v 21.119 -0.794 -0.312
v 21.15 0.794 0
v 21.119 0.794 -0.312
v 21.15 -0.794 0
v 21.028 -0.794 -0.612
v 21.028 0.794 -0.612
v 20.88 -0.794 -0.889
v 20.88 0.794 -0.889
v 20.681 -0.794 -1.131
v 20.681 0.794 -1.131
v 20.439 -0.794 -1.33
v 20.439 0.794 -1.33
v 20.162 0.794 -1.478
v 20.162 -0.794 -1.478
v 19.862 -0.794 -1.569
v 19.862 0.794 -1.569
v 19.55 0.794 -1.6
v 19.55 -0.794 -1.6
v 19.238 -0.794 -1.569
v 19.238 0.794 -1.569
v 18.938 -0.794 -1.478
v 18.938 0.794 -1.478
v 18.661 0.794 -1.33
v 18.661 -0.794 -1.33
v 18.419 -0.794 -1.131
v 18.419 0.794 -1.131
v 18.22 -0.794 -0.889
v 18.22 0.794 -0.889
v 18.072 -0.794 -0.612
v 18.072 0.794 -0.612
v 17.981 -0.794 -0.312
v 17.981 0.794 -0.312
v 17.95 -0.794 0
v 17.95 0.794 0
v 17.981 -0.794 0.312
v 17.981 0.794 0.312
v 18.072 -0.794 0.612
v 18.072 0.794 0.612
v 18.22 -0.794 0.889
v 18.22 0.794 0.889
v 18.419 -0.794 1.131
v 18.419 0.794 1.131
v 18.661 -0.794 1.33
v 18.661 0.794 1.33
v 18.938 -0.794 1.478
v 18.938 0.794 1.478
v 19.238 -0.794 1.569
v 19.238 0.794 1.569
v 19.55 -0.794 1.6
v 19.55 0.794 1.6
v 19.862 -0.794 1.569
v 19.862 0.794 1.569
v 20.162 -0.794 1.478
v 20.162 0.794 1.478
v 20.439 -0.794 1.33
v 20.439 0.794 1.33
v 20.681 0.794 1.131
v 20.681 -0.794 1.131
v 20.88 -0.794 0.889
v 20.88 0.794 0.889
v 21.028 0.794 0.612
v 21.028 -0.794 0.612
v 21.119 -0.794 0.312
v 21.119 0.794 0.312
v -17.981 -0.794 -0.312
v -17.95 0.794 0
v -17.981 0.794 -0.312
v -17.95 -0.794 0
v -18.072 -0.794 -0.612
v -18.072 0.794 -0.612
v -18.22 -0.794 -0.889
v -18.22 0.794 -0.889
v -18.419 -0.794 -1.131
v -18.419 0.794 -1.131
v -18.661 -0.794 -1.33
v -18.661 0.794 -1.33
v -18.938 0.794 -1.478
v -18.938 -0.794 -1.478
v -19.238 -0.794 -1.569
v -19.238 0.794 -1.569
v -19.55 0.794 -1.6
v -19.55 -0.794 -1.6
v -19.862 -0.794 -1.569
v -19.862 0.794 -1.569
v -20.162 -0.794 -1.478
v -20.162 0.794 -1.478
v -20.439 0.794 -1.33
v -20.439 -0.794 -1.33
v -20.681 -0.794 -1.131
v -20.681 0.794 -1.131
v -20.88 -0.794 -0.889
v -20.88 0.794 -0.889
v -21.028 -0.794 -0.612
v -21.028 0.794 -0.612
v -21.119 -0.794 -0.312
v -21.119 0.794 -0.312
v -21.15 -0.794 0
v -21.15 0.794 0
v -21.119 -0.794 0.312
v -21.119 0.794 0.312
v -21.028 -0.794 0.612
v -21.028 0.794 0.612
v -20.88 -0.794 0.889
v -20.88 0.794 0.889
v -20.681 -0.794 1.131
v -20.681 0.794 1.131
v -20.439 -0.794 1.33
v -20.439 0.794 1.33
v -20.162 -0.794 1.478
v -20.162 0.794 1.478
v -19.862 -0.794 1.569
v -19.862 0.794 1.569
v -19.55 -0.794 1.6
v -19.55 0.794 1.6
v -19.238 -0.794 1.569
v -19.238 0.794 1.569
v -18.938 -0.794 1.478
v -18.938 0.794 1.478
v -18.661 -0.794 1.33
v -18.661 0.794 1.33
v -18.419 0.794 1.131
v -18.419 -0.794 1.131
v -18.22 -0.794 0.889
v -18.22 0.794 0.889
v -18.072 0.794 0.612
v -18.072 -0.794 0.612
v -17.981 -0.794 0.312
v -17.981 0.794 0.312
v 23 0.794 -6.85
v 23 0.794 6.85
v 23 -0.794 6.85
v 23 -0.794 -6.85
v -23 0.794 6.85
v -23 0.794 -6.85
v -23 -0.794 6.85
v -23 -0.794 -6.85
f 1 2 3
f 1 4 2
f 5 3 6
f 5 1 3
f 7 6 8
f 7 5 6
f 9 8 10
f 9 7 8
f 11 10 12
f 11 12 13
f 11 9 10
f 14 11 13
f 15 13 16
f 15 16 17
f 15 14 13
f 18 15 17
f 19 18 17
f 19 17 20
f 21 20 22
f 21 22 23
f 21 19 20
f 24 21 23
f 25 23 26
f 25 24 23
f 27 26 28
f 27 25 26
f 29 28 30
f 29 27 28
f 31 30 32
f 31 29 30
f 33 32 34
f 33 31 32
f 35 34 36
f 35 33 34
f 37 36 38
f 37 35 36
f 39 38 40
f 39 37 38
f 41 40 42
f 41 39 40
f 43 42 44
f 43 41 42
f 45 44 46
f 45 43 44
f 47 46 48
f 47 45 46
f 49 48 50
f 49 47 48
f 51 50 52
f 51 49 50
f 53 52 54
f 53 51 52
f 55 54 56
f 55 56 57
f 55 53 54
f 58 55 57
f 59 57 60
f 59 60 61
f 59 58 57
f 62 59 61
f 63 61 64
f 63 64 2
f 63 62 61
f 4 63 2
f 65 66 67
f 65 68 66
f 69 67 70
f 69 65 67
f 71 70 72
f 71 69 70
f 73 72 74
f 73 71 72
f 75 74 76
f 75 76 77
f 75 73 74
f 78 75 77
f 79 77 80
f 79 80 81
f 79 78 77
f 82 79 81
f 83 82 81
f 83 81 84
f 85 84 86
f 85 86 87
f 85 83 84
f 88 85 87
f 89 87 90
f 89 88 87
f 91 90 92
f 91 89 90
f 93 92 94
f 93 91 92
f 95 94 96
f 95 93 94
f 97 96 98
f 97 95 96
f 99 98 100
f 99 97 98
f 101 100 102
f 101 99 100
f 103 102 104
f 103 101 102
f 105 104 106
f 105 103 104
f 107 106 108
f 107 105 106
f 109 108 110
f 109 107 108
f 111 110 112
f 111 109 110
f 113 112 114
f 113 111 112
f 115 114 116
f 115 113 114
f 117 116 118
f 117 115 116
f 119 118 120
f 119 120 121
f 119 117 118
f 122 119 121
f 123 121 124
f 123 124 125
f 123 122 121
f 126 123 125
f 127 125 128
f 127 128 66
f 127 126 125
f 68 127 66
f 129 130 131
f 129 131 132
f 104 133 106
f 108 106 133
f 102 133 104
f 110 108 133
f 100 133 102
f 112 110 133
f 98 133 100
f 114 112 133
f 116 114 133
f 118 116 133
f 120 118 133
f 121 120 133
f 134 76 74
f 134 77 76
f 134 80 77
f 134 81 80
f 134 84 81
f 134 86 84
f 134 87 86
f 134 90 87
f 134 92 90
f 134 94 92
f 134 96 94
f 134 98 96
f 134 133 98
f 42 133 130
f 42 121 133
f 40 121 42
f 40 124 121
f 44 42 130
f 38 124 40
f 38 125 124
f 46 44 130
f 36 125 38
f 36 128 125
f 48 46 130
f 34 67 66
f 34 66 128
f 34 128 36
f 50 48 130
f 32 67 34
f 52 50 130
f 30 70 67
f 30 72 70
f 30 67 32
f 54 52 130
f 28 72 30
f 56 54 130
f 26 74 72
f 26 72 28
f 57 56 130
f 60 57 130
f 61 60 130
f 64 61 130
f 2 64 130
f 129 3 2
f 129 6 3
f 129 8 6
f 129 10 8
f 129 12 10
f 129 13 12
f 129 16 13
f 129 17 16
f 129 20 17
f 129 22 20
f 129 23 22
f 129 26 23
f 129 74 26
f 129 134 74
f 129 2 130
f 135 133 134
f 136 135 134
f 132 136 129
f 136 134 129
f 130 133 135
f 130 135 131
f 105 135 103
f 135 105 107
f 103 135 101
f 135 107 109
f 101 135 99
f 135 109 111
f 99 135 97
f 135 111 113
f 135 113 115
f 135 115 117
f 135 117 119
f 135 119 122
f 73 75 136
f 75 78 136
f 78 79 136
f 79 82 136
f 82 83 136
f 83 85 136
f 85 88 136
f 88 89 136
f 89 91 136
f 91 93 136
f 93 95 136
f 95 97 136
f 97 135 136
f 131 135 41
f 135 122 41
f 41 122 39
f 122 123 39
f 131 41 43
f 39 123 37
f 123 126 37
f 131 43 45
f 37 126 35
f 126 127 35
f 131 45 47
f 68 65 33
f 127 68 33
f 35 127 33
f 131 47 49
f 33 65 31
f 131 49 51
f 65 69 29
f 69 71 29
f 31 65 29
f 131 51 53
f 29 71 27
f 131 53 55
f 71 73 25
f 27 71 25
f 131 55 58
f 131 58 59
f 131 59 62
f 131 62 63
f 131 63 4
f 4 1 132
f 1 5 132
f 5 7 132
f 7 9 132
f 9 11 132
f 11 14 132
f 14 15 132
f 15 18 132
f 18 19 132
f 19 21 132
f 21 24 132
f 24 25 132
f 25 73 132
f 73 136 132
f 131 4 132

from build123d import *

# Parameters (mm, degrees)
SKETCH1_W           = 45.999999948
SKETCH1_H           = 13.700000032
SKETCH1_R           = 1.599999975
BOSS_EXTRUDE1_DEPTH = 0.79375


with BuildPart() as part:
    # Sketch1 → Boss-Extrude1 (new body, symmetric)
    with BuildSketch(Plane(origin=(0, 0, 0), x_dir=(1, 0, 0), z_dir=(0, 1, 0))):
        Rectangle(SKETCH1_W, SKETCH1_H)
        with Locations((-19.550000016, 0)):
            Circle(SKETCH1_R, mode=Mode.SUBTRACT)
        with Locations((19.550000016, 0)):
            Circle(SKETCH1_R, mode=Mode.SUBTRACT)
    extrude(amount=BOSS_EXTRUDE1_DEPTH, both=True)


solid = part.part
